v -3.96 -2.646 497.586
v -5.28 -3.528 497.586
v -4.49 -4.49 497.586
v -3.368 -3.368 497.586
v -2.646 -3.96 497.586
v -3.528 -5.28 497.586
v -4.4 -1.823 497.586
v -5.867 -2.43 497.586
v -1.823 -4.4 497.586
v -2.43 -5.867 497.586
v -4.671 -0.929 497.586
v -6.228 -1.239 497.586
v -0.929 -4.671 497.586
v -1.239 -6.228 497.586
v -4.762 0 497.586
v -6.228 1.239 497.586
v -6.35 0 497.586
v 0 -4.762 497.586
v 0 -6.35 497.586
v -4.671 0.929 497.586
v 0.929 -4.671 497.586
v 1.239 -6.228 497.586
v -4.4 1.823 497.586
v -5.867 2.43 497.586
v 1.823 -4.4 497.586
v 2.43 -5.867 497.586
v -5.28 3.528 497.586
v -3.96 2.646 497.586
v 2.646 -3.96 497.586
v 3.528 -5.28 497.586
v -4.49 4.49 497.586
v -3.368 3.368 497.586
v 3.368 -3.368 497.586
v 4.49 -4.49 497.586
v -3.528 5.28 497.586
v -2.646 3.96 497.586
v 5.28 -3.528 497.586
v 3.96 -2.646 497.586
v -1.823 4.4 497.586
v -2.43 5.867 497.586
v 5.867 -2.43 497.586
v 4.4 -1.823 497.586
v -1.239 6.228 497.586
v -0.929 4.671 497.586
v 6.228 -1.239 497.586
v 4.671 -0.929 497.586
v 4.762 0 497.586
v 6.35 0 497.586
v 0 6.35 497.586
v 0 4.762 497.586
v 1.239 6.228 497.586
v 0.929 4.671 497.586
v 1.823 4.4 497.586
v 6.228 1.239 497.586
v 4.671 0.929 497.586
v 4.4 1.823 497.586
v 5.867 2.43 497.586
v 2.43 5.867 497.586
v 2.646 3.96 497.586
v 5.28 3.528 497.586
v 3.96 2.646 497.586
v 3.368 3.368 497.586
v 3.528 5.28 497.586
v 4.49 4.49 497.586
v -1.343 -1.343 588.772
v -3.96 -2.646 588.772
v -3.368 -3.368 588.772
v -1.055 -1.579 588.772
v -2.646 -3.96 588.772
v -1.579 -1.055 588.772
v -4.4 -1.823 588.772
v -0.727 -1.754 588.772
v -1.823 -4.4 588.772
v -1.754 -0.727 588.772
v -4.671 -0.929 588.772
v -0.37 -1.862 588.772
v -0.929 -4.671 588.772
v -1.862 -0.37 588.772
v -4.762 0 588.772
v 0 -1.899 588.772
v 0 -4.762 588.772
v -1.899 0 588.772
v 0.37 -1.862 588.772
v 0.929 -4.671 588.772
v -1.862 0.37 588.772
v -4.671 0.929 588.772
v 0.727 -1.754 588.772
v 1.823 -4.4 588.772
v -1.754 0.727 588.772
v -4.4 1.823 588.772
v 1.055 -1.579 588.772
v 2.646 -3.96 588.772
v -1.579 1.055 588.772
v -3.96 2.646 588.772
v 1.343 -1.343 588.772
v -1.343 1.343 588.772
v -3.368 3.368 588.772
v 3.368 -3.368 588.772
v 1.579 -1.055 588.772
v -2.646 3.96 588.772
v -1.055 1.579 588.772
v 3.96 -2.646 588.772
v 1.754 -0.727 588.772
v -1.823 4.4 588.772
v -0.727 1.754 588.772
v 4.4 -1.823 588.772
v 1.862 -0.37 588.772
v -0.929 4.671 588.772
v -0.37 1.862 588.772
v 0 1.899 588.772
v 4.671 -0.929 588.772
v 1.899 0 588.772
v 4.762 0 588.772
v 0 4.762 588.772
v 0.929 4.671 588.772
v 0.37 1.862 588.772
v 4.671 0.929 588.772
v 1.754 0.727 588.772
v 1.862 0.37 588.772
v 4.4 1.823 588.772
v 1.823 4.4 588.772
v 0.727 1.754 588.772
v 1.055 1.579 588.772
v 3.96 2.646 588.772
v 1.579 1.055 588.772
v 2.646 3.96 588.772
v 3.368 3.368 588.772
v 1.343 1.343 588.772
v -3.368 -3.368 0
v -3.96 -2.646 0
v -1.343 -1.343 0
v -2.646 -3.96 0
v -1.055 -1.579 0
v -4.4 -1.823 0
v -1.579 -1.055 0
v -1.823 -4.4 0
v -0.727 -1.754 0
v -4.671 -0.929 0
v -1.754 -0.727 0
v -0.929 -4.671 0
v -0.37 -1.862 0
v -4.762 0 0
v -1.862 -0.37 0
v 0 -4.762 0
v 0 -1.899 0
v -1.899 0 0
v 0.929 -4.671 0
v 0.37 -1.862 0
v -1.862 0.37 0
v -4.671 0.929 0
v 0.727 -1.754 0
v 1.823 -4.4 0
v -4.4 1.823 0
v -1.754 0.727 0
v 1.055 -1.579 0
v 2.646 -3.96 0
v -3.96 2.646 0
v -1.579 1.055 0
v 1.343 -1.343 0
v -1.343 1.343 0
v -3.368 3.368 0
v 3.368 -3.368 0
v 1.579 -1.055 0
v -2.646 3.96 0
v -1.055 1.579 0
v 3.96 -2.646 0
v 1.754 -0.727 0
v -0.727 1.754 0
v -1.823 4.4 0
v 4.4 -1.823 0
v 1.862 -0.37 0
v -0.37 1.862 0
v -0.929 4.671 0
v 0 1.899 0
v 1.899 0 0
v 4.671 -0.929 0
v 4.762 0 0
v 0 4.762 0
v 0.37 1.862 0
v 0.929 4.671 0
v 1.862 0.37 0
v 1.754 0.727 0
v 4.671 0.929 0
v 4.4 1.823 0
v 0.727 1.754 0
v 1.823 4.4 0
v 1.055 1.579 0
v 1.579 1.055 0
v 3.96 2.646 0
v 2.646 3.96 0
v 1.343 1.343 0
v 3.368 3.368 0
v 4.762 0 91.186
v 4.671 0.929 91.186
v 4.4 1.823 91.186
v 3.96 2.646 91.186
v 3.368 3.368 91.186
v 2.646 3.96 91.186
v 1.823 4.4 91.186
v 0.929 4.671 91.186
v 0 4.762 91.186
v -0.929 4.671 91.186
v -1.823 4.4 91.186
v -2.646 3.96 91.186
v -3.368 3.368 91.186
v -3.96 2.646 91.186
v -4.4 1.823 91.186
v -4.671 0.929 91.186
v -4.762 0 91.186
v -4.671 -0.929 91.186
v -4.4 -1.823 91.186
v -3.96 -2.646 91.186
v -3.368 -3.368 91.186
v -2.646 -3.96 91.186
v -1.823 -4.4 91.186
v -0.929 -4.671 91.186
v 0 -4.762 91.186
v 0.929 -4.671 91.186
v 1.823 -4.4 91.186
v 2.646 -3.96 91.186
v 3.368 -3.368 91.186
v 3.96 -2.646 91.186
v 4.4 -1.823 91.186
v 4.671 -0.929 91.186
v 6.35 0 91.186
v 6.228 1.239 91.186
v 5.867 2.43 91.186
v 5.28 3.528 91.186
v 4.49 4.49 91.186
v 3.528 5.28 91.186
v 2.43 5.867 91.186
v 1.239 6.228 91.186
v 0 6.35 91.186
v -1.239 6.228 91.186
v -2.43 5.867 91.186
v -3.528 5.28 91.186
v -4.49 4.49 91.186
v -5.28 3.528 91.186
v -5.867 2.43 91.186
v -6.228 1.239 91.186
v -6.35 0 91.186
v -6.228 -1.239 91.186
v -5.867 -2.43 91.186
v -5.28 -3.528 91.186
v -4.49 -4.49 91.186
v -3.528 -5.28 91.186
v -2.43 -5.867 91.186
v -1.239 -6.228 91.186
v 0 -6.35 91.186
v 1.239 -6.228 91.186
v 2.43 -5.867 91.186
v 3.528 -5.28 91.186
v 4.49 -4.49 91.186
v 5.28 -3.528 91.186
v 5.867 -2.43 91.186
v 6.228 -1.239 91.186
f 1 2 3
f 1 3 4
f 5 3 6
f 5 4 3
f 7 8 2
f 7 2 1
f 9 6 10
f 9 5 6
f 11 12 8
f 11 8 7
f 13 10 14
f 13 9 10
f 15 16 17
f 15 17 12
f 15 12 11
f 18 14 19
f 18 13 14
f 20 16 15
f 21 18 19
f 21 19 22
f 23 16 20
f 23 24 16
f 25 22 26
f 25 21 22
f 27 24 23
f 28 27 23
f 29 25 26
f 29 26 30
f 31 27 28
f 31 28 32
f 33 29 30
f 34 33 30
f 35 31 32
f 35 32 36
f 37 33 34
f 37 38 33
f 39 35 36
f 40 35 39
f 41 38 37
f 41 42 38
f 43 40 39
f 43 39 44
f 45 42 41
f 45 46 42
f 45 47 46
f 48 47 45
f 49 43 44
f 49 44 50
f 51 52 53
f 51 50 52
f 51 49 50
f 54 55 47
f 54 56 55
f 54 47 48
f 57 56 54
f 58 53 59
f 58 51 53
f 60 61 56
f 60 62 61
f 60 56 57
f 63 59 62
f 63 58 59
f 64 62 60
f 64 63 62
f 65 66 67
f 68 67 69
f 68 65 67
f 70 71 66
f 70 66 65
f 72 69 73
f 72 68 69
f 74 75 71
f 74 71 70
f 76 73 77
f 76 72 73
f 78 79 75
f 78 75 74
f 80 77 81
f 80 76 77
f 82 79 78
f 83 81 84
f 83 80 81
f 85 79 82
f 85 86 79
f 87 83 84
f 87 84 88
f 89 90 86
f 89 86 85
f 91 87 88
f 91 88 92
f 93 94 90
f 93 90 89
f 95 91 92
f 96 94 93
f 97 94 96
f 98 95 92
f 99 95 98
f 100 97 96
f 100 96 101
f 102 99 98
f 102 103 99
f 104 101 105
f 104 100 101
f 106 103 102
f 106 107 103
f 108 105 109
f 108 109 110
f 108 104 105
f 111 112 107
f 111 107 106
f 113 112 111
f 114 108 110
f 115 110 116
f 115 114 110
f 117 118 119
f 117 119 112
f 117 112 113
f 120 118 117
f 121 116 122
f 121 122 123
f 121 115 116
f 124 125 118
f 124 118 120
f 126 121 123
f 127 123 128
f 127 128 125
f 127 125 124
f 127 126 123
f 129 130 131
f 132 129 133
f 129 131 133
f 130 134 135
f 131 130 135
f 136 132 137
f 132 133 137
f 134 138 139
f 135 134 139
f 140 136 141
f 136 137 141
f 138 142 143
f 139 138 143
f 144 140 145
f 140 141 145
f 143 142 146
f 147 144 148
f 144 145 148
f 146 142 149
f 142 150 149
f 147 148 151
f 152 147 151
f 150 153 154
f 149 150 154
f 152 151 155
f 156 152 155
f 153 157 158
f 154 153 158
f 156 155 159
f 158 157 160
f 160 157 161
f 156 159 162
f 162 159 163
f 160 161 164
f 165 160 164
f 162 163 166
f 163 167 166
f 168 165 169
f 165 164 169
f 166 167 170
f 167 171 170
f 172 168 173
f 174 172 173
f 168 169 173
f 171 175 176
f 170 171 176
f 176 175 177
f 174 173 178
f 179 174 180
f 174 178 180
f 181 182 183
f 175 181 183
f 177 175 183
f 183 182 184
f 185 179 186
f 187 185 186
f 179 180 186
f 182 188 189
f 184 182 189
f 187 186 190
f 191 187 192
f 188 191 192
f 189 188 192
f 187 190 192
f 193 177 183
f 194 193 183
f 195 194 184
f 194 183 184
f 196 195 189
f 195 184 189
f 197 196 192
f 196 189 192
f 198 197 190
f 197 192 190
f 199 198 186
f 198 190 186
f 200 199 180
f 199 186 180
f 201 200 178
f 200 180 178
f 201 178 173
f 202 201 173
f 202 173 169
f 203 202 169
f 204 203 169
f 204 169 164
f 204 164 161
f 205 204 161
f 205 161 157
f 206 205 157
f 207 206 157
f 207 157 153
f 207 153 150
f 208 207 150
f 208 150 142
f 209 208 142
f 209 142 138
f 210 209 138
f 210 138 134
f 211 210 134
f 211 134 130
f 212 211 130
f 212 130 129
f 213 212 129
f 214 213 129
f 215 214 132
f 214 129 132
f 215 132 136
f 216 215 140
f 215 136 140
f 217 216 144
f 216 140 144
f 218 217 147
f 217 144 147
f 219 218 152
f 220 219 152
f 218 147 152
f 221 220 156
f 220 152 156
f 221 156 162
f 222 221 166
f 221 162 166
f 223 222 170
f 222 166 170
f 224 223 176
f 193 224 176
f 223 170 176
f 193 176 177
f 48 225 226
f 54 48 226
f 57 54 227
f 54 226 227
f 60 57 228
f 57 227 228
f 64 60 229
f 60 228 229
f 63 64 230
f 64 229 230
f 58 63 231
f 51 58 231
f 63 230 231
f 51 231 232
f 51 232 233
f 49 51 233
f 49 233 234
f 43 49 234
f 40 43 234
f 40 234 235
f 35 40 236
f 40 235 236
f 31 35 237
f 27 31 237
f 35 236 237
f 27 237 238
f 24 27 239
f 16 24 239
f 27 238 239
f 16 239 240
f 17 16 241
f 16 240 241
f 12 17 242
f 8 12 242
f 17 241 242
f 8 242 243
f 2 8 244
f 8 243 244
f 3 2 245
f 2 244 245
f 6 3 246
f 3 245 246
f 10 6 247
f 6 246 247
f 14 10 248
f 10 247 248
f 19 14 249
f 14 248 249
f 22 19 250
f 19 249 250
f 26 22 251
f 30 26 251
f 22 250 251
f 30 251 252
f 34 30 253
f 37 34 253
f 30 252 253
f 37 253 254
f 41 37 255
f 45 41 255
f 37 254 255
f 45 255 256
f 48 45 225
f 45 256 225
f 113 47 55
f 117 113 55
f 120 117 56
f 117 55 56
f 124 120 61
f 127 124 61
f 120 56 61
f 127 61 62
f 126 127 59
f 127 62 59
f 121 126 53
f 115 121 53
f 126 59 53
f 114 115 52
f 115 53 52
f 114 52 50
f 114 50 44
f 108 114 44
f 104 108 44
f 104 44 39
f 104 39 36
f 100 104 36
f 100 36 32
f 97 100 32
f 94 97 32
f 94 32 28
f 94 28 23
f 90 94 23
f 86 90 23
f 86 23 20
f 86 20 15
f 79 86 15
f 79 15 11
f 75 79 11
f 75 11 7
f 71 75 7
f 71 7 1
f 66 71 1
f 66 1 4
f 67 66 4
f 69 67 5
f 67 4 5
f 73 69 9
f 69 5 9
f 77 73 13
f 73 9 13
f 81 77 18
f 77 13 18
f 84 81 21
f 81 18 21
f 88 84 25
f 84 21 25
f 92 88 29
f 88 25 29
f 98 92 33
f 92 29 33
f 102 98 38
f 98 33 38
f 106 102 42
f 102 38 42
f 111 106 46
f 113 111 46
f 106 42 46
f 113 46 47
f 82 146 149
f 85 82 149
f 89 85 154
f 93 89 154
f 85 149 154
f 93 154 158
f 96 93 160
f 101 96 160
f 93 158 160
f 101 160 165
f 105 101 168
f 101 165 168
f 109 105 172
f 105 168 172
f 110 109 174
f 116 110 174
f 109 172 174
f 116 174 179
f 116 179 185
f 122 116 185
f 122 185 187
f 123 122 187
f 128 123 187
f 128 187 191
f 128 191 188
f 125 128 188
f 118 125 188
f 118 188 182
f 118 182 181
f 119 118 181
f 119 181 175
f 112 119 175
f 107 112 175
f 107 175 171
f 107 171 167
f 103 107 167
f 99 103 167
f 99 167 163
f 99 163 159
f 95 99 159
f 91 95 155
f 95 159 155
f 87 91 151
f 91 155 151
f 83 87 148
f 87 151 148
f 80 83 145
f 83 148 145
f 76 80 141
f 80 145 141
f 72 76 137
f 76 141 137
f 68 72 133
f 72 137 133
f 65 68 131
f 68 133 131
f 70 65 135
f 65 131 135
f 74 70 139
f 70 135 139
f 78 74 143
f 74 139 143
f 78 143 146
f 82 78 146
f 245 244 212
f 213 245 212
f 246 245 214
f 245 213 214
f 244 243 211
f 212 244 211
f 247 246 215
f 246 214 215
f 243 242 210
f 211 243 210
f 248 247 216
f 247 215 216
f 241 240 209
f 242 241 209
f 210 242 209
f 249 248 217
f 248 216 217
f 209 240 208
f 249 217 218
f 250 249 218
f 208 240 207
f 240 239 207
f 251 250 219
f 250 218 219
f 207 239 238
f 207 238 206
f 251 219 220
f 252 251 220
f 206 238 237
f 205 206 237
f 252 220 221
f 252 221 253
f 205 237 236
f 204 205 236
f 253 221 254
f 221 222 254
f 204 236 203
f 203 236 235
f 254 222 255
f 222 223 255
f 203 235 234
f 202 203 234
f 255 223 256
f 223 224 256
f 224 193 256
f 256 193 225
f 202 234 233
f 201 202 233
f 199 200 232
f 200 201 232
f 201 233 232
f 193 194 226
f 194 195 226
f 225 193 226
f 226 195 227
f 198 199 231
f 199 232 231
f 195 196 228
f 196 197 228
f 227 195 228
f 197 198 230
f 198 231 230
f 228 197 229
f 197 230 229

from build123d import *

# Parameters (mm, degrees)
SKETCH1_R                    = 4.7625
BOSS_EXTRUDE1_DEPTH          = 588.772
BOSS_EXTRUDE2_START          = 91.186
SKETCH1_3_R                  = 6.35
SKETCH1_3_R_2                = 4.7625
BOSS_EXTRUDE2_DEPTH          = 406.4
F_25_0_1495_DIAMETER_HOLE1_D = 3.7973


with BuildPart() as part:
    # Sketch1 → Boss-Extrude1 (new body)
    with BuildSketch(Plane.XY):
        Circle(SKETCH1_R)
    extrude(amount=BOSS_EXTRUDE1_DEPTH)

    # Sketch1<3> → Boss-Extrude2 (add)
    with BuildSketch(Plane.XY.offset(BOSS_EXTRUDE2_START)):
        Circle(SKETCH1_3_R)
        Circle(SKETCH1_3_R_2, mode=Mode.SUBTRACT)
    extrude(amount=BOSS_EXTRUDE2_DEPTH)

    # #25 (0.1495) Diameter Hole1 (through all)
    with Locations(Plane.XY.offset(588.772)):
        with Locations((0, 0)):
            Hole(F_25_0_1495_DIAMETER_HOLE1_D / 2)


solid = part.part
